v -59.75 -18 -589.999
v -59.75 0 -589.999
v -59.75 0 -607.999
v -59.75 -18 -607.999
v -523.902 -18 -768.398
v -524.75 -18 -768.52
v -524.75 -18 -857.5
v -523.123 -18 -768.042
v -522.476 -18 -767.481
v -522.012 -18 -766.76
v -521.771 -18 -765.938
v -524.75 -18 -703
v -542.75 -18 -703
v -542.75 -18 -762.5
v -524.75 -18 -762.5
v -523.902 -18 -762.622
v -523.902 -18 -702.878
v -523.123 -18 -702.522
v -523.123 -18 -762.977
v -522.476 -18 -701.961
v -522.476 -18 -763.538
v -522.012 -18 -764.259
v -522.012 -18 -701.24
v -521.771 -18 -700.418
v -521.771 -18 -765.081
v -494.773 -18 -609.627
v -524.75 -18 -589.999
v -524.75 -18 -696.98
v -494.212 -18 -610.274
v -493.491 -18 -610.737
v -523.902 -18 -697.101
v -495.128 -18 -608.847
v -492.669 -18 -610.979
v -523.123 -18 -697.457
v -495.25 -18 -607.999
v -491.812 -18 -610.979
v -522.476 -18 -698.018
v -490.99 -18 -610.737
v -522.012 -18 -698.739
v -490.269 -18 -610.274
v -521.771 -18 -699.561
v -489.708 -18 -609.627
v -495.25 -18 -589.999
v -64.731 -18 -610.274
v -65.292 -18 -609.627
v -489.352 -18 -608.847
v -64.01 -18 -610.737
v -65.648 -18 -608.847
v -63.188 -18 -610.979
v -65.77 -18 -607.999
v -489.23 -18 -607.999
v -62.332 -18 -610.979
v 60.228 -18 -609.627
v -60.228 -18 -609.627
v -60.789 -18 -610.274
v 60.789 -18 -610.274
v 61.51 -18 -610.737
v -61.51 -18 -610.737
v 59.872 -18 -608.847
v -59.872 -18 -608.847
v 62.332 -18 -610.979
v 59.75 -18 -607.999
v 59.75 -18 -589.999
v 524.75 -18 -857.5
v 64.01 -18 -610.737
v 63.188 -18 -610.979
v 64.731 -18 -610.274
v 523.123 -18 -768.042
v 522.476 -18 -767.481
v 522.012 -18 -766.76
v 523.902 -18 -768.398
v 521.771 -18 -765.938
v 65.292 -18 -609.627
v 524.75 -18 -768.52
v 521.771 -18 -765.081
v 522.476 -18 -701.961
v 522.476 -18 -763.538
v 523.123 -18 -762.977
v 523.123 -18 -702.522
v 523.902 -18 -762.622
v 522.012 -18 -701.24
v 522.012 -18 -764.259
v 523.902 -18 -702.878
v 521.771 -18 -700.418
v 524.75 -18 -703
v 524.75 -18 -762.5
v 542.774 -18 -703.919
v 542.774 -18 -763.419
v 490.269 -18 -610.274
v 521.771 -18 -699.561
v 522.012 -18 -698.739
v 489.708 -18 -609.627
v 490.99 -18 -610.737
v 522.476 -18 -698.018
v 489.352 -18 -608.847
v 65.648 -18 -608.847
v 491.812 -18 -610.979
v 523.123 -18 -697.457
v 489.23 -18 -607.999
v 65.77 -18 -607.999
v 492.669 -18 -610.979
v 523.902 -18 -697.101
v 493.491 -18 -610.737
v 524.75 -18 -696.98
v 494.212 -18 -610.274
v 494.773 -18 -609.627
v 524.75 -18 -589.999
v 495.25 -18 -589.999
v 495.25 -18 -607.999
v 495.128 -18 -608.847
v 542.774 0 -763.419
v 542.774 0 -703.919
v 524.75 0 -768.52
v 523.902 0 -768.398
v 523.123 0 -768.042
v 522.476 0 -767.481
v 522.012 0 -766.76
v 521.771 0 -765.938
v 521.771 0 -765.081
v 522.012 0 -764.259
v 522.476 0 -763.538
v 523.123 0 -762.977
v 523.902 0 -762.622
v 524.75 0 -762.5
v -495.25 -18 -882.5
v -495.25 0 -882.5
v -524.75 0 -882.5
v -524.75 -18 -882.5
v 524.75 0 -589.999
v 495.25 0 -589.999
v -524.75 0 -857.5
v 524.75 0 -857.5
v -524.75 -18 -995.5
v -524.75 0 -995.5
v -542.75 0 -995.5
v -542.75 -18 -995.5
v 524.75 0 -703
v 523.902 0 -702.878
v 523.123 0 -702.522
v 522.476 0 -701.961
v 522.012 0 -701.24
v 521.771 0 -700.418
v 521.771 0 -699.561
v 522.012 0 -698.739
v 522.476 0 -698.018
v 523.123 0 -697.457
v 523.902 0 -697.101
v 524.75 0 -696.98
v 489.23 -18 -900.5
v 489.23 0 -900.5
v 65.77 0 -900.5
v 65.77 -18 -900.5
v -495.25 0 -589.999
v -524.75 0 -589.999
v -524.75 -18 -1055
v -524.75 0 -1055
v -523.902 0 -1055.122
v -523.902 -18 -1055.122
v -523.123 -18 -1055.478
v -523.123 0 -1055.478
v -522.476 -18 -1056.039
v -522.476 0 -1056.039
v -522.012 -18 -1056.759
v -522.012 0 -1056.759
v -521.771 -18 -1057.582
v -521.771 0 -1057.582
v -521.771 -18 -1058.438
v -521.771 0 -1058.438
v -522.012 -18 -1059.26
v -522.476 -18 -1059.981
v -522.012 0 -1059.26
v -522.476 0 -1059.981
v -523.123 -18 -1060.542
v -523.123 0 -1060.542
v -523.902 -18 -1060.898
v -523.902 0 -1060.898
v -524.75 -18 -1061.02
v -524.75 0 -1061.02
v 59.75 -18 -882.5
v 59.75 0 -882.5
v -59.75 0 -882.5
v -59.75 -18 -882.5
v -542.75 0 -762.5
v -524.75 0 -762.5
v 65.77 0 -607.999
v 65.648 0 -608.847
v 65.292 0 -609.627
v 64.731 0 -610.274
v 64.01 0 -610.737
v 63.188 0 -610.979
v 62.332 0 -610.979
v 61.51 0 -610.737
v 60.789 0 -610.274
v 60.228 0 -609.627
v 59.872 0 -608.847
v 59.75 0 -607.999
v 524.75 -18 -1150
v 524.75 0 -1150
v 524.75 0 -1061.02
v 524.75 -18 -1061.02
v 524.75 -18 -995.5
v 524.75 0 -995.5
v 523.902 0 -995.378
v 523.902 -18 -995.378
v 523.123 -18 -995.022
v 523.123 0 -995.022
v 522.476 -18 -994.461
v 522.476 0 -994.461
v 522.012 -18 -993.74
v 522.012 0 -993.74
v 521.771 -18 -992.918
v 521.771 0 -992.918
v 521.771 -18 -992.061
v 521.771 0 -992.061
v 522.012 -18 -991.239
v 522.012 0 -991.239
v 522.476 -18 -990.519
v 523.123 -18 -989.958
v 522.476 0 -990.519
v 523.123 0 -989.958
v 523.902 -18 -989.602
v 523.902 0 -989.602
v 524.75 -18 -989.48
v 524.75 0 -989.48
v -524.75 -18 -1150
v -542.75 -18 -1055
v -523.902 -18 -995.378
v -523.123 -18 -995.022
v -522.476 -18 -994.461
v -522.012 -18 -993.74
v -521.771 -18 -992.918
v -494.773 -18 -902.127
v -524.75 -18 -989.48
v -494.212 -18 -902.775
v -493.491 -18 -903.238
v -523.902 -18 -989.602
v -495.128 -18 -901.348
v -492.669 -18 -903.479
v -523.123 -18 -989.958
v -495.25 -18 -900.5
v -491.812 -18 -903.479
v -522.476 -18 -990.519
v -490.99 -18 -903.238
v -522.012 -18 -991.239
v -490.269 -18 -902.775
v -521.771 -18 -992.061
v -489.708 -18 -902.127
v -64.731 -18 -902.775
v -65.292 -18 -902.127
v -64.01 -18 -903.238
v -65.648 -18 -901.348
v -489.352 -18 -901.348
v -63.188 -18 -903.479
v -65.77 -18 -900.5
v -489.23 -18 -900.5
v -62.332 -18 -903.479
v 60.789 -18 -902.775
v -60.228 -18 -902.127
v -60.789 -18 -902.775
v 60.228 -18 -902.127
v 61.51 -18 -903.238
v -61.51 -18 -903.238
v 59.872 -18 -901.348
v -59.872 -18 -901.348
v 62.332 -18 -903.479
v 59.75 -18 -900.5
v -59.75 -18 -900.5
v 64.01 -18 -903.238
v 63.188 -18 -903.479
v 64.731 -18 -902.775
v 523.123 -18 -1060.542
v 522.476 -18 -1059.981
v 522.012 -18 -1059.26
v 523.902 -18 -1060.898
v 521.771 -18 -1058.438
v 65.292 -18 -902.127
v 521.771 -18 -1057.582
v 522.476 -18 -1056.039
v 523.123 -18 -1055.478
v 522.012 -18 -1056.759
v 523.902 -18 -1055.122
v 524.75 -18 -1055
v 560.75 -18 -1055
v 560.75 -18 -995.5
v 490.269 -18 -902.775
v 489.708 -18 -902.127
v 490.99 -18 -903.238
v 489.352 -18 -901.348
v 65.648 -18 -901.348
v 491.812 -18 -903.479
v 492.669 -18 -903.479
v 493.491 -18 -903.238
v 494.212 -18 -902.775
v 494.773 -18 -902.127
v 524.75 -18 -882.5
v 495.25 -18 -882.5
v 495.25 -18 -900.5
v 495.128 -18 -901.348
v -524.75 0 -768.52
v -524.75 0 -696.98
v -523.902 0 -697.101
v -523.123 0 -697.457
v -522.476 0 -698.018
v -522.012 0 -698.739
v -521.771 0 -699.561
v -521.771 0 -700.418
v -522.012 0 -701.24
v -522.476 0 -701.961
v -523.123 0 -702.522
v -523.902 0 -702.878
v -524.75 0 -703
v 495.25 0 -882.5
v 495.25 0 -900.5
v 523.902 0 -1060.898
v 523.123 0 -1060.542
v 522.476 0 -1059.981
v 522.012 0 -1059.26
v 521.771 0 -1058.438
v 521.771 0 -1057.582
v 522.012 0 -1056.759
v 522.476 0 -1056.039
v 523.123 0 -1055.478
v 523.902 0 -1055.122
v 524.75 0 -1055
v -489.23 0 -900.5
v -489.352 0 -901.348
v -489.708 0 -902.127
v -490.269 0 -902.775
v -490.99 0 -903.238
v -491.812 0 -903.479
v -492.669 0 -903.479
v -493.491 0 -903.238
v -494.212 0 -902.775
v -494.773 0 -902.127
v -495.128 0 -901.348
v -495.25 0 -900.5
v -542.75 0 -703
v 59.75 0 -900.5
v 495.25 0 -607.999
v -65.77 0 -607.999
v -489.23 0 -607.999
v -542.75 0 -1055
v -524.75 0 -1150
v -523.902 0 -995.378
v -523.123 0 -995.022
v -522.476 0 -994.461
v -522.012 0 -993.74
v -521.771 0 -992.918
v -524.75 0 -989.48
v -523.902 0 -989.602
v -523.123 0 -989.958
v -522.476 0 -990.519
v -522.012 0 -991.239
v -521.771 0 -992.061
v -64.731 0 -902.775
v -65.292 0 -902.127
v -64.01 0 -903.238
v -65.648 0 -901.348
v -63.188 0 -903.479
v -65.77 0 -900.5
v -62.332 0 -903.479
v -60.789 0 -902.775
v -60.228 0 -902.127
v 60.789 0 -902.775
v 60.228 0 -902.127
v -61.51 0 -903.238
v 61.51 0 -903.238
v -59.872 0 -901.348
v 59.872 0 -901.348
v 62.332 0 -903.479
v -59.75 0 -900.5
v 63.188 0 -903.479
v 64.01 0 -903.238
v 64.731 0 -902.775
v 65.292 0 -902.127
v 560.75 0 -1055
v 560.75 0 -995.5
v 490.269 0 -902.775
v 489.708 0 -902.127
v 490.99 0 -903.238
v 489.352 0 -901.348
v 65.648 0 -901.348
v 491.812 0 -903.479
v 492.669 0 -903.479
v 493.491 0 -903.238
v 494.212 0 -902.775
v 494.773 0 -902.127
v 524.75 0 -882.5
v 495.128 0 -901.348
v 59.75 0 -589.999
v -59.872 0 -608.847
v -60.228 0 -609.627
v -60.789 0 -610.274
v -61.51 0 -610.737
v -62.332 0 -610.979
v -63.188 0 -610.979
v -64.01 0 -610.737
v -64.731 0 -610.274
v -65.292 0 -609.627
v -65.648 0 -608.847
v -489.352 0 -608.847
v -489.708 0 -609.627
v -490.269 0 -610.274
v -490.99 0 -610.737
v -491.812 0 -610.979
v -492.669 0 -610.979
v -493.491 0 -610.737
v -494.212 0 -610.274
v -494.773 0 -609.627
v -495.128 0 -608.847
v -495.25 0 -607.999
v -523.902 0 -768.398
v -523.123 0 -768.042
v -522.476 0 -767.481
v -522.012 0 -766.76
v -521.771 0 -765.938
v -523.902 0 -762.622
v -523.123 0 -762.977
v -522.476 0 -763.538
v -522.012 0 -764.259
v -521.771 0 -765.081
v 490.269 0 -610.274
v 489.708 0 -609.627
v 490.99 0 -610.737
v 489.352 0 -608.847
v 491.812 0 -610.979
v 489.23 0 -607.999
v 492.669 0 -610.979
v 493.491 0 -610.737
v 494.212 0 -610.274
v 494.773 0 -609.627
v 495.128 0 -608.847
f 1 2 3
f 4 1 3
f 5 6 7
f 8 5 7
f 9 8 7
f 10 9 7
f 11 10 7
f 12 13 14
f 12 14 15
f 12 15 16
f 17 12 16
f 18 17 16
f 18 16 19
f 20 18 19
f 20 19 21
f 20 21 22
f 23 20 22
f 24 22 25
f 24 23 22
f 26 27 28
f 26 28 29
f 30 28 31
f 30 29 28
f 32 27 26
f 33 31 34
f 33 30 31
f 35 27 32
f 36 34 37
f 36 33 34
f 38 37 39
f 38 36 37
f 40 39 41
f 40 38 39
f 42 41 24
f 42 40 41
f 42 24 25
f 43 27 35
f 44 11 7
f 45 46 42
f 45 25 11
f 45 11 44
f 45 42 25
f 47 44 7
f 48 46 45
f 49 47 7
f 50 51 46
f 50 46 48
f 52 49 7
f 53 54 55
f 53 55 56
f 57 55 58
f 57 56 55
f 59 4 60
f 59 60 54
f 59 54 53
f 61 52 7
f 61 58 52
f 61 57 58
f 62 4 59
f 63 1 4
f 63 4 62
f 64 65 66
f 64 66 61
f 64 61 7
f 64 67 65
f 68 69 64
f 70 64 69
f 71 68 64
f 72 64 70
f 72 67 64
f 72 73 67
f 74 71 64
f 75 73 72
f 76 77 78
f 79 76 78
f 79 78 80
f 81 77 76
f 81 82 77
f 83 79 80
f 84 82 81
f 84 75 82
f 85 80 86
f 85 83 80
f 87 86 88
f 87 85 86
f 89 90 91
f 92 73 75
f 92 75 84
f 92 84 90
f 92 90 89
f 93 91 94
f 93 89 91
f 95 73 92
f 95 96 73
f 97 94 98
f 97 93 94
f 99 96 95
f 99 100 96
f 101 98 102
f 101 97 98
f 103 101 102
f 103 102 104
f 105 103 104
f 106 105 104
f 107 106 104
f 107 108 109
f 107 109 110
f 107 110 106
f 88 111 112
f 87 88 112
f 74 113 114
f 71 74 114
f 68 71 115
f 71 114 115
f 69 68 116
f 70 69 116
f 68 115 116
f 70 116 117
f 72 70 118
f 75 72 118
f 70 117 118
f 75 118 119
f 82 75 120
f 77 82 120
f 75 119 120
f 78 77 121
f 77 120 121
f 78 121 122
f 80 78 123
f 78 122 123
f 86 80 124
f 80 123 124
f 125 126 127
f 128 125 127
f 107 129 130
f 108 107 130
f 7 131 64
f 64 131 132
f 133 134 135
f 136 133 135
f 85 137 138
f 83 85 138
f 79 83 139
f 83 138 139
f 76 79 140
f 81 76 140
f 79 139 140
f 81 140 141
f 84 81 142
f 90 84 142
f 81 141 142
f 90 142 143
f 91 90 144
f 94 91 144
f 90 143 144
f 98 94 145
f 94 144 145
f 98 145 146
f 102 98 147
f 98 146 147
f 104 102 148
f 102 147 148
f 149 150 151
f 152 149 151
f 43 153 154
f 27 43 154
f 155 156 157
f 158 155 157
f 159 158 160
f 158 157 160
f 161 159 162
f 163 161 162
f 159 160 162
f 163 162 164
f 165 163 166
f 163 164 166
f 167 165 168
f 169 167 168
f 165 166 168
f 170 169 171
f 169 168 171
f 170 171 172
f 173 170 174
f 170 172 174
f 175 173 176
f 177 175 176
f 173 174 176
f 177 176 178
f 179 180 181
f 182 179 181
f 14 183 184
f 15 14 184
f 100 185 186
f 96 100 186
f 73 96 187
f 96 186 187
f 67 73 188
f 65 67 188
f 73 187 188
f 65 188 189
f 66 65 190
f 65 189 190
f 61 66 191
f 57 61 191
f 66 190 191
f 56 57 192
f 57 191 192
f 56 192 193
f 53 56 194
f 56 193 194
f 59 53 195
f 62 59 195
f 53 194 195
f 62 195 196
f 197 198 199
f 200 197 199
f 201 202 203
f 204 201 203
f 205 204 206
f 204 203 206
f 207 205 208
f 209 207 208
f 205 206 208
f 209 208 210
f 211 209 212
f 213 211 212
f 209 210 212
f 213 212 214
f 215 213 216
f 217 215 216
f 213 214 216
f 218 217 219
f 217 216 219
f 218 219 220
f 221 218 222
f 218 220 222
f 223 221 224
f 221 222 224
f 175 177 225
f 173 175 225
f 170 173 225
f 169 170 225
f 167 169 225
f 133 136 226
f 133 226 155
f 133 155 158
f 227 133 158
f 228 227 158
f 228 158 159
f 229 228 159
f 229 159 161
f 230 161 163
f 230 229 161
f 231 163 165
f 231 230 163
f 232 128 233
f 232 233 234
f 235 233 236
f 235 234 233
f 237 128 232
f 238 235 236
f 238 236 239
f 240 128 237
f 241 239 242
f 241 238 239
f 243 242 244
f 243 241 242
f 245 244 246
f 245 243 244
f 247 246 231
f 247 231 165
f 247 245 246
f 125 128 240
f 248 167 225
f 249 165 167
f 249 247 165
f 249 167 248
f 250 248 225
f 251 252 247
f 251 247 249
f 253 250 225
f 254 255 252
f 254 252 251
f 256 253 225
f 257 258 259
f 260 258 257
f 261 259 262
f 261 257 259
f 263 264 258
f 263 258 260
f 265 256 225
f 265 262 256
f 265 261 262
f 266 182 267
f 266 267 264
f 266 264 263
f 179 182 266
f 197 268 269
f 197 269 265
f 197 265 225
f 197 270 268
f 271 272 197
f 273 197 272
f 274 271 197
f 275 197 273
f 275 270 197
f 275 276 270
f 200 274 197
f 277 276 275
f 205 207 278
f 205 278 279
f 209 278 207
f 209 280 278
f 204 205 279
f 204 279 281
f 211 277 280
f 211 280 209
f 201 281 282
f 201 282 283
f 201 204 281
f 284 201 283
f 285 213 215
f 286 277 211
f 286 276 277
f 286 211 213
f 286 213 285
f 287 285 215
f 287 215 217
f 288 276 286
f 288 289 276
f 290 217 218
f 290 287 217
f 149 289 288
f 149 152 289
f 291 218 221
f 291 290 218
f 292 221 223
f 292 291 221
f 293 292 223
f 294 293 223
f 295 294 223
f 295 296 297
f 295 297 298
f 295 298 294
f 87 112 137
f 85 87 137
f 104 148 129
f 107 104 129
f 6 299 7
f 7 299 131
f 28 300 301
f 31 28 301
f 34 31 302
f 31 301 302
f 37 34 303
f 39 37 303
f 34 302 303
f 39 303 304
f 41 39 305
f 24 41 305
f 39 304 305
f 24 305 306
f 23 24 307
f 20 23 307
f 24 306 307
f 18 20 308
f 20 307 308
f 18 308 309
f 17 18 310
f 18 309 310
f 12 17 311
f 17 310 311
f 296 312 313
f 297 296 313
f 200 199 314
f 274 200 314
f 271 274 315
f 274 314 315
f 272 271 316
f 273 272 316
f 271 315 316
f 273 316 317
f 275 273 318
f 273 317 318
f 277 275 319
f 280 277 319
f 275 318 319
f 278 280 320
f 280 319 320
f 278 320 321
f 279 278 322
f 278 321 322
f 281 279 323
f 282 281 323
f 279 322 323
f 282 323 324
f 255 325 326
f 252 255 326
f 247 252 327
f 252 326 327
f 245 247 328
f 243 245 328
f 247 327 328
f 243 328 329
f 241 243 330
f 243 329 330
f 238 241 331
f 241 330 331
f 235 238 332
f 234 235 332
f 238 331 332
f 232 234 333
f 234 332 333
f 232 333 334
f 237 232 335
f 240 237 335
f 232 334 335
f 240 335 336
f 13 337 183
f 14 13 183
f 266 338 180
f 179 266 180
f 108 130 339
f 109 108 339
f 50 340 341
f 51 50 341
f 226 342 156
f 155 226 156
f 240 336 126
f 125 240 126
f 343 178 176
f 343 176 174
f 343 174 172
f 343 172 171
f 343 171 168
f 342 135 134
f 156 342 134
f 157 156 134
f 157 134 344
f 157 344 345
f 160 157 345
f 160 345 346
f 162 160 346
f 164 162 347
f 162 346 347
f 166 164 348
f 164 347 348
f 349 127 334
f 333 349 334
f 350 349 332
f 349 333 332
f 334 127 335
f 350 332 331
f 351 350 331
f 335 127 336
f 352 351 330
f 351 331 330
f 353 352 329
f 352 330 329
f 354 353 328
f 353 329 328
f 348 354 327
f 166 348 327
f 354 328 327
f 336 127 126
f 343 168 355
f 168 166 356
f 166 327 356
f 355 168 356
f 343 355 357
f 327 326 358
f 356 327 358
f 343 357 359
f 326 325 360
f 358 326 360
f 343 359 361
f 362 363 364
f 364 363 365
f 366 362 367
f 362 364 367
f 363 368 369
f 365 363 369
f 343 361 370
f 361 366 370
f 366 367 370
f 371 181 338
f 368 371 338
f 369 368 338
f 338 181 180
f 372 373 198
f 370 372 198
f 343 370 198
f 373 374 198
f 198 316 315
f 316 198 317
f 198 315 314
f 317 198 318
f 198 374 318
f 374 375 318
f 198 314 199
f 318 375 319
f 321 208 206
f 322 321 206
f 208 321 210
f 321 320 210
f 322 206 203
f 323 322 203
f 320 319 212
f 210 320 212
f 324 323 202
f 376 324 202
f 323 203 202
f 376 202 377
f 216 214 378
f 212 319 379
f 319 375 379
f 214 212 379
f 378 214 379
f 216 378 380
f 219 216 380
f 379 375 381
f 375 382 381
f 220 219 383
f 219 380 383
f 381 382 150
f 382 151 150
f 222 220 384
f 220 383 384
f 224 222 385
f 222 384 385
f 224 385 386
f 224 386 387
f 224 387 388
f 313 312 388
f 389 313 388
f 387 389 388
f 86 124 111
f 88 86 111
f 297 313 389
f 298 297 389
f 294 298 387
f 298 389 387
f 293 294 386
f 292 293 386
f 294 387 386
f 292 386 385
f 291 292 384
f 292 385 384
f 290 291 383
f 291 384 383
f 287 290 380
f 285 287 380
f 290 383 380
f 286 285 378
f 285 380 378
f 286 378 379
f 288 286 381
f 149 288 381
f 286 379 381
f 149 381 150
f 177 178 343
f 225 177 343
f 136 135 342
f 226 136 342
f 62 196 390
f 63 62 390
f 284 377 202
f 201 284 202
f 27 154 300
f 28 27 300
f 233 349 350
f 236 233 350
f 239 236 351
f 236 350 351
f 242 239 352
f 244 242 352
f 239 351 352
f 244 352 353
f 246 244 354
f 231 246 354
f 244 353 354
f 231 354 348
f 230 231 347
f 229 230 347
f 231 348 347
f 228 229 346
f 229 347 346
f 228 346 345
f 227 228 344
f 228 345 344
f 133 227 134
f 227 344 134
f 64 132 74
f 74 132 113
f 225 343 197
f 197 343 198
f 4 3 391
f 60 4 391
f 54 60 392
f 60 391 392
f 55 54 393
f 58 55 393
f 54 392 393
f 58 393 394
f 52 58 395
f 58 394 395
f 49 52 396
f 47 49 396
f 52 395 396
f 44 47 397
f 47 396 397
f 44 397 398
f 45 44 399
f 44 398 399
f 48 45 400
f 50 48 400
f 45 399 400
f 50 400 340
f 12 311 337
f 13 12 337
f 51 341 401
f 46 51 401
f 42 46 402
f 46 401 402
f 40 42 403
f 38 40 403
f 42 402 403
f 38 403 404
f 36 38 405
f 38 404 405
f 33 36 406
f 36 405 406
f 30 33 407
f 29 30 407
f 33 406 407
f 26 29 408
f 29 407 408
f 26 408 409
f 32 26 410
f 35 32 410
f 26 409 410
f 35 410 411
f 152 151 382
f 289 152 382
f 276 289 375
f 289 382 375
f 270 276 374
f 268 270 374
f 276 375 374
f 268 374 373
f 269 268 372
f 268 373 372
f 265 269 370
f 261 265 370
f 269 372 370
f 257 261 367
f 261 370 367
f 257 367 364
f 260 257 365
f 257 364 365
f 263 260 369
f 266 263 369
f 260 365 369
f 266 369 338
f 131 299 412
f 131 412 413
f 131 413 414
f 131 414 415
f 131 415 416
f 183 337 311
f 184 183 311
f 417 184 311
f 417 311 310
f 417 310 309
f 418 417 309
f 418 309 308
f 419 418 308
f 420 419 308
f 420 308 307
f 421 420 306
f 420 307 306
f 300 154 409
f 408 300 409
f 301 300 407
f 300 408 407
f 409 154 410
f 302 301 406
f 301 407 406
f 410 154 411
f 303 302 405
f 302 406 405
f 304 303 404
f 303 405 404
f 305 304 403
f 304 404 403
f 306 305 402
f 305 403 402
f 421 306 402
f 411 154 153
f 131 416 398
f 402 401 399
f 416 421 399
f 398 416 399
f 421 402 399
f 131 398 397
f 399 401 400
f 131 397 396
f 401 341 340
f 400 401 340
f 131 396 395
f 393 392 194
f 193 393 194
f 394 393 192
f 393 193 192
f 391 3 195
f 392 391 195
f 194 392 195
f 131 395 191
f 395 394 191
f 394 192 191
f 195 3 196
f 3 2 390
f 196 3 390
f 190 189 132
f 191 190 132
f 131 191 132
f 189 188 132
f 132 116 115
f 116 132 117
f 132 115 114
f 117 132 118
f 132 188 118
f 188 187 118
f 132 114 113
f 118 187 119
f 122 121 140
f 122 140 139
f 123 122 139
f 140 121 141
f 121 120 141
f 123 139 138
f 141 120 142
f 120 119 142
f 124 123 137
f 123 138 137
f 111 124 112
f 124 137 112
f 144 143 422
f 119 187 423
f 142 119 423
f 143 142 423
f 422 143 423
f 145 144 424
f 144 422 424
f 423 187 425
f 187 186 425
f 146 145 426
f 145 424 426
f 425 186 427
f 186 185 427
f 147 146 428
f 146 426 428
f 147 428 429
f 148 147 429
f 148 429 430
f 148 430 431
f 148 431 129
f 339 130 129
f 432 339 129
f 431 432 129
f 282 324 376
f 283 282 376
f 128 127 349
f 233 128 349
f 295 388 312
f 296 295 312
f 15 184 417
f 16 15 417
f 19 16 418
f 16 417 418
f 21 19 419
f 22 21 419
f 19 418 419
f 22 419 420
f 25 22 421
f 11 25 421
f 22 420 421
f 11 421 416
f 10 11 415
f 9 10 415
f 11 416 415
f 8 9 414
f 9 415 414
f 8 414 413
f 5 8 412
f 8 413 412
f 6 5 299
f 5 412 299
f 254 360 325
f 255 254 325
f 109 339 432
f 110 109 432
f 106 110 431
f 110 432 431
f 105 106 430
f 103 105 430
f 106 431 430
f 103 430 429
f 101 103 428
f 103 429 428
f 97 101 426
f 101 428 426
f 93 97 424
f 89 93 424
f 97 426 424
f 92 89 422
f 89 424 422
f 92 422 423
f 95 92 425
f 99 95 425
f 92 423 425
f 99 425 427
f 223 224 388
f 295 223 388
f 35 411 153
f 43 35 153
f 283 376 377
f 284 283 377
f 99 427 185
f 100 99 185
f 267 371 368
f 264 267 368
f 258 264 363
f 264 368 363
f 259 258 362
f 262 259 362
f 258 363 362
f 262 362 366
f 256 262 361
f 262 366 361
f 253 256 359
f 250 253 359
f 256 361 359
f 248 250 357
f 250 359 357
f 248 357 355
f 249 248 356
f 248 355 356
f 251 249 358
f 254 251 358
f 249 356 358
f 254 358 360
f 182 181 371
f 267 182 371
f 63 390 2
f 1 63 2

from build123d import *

# Parameters (mm, degrees)
F1_DEPTH = 18
F2_DEPTH = 18


with BuildPart() as f1:
    # F0 (on Front) → F1 (new body)
    with BuildSketch(Plane.XZ):
        with BuildLine():
            Line((59.750059, -882.499732), (-59.750061, -882.499732))
            Line((-59.750061, -882.499732), (-59.750061, -900.49975))
            ThreePointArc((-59.750061, -900.49975), (-62.760061, -903.50975), (-65.770061, -900.49975))
            Line((-65.770061, -900.49975), (-489.230416, -900.49975))
            ThreePointArc((-489.230416, -900.49975), (-492.240416, -903.50975), (-495.250416, -900.49975))
            Line((-495.250416, -900.49975), (-495.250416, -882.499732))
            Line((-495.250416, -882.499732), (-524.750446, -882.499732))
            Line((-524.750446, -882.499732), (-524.750446, -989.479835))
            ThreePointArc((-524.750446, -989.479835), (-521.740446, -992.489835), (-524.750446, -995.499835))
            Line((-524.750446, -995.499835), (-542.750482, -995.499835))
            Line((-542.750482, -995.499835), (-542.750482, -1054.999895))
            Line((-542.750482, -1054.999895), (-524.750446, -1054.999895))
            ThreePointArc((-524.750446, -1054.999895), (-521.740446, -1058.009895), (-524.750446, -1061.019895))
            Line((-524.750446, -1061.019895), (-524.750446, -1150))
            Line((-524.750446, -1150), (524.750445, -1150))
            Line((524.750445, -1150), (524.750445, -1061.019895))
            ThreePointArc((524.750445, -1061.019895), (521.740445, -1058.009895), (524.750445, -1054.999895))
            Line((524.750445, -1054.999895), (560.750481, -1054.999895))
            Line((560.750481, -1054.999895), (560.750481, -995.499835))
            Line((560.750481, -995.499835), (524.750445, -995.499835))
            ThreePointArc((524.750445, -995.499835), (521.740445, -992.489835), (524.750445, -989.479835))
            Line((524.750445, -989.479835), (524.750445, -882.499732))
            Line((524.750445, -882.499732), (495.250415, -882.499732))
            Line((495.250415, -882.499732), (495.250415, -900.49975))
            ThreePointArc((495.250415, -900.49975), (492.240415, -903.50975), (489.230415, -900.49975))
            Line((489.230415, -900.49975), (65.770059, -900.49975))
            ThreePointArc((65.770059, -900.49975), (62.760059, -903.50975), (59.750059, -900.49975))
            Line((59.750059, -900.49975), (59.750059, -882.499732))
        make_face()
    extrude(amount=F1_DEPTH)


with BuildPart() as f2:
    # F0 (on Front) → F2 (new body)
    with BuildSketch(Plane.XZ):
        with BuildLine():
            Line((59.750059, -589.999464), (-59.750061, -589.999464))
            Line((-59.750061, -589.999464), (-59.750061, -607.999482))
            ThreePointArc((-59.750061, -607.999482), (-62.760061, -611.009482), (-65.770061, -607.999482))
            Line((-65.770061, -607.999482), (-489.230416, -607.999482))
            ThreePointArc((-489.230416, -607.999482), (-492.240416, -611.009482), (-495.250416, -607.999482))
            Line((-495.250416, -607.999482), (-495.250416, -589.999464))
            Line((-495.250416, -589.999464), (-524.750446, -589.999464))
            Line((-524.750446, -589.999464), (-524.750446, -696.979567))
            ThreePointArc((-524.750446, -696.979567), (-521.740446, -699.989567), (-524.750446, -702.999567))
            Line((-524.750446, -702.999567), (-542.750482, -702.999567))
            Line((-542.750482, -702.999567), (-542.750482, -762.499627))
            Line((-542.750482, -762.499627), (-524.750446, -762.499627))
            ThreePointArc((-524.750446, -762.499627), (-521.740446, -765.509627), (-524.750446, -768.519627))
            Line((-524.750446, -768.519627), (-524.750446, -857.499732))
            Line((-524.750446, -857.499732), (524.750445, -857.499732))
            Line((524.750445, -857.499732), (524.750445, -768.519627))
            ThreePointArc((524.750445, -768.519627), (521.740445, -765.509627), (524.750445, -762.499627))
            Line((524.750445, -762.499627), (542.773967, -763.418841))
            Line((542.773967, -763.418841), (542.773967, -703.918781))
            Line((542.773967, -703.918781), (524.750445, -702.999567))
            ThreePointArc((524.750445, -702.999567), (521.740445, -699.989567), (524.750445, -696.979567))
            Line((524.750445, -696.979567), (524.750445, -589.999464))
            Line((524.750445, -589.999464), (495.250415, -589.999464))
            Line((495.250415, -589.999464), (495.250415, -607.999482))
            ThreePointArc((495.250415, -607.999482), (492.240415, -611.009482), (489.230415, -607.999482))
            Line((489.230415, -607.999482), (65.770059, -607.999482))
            ThreePointArc((65.770059, -607.999482), (62.760059, -611.009482), (59.750059, -607.999482))
            Line((59.750059, -607.999482), (59.750059, -589.999464))
        make_face()
    extrude(amount=F2_DEPTH)


solid = Compound([f1.part, f2.part])
